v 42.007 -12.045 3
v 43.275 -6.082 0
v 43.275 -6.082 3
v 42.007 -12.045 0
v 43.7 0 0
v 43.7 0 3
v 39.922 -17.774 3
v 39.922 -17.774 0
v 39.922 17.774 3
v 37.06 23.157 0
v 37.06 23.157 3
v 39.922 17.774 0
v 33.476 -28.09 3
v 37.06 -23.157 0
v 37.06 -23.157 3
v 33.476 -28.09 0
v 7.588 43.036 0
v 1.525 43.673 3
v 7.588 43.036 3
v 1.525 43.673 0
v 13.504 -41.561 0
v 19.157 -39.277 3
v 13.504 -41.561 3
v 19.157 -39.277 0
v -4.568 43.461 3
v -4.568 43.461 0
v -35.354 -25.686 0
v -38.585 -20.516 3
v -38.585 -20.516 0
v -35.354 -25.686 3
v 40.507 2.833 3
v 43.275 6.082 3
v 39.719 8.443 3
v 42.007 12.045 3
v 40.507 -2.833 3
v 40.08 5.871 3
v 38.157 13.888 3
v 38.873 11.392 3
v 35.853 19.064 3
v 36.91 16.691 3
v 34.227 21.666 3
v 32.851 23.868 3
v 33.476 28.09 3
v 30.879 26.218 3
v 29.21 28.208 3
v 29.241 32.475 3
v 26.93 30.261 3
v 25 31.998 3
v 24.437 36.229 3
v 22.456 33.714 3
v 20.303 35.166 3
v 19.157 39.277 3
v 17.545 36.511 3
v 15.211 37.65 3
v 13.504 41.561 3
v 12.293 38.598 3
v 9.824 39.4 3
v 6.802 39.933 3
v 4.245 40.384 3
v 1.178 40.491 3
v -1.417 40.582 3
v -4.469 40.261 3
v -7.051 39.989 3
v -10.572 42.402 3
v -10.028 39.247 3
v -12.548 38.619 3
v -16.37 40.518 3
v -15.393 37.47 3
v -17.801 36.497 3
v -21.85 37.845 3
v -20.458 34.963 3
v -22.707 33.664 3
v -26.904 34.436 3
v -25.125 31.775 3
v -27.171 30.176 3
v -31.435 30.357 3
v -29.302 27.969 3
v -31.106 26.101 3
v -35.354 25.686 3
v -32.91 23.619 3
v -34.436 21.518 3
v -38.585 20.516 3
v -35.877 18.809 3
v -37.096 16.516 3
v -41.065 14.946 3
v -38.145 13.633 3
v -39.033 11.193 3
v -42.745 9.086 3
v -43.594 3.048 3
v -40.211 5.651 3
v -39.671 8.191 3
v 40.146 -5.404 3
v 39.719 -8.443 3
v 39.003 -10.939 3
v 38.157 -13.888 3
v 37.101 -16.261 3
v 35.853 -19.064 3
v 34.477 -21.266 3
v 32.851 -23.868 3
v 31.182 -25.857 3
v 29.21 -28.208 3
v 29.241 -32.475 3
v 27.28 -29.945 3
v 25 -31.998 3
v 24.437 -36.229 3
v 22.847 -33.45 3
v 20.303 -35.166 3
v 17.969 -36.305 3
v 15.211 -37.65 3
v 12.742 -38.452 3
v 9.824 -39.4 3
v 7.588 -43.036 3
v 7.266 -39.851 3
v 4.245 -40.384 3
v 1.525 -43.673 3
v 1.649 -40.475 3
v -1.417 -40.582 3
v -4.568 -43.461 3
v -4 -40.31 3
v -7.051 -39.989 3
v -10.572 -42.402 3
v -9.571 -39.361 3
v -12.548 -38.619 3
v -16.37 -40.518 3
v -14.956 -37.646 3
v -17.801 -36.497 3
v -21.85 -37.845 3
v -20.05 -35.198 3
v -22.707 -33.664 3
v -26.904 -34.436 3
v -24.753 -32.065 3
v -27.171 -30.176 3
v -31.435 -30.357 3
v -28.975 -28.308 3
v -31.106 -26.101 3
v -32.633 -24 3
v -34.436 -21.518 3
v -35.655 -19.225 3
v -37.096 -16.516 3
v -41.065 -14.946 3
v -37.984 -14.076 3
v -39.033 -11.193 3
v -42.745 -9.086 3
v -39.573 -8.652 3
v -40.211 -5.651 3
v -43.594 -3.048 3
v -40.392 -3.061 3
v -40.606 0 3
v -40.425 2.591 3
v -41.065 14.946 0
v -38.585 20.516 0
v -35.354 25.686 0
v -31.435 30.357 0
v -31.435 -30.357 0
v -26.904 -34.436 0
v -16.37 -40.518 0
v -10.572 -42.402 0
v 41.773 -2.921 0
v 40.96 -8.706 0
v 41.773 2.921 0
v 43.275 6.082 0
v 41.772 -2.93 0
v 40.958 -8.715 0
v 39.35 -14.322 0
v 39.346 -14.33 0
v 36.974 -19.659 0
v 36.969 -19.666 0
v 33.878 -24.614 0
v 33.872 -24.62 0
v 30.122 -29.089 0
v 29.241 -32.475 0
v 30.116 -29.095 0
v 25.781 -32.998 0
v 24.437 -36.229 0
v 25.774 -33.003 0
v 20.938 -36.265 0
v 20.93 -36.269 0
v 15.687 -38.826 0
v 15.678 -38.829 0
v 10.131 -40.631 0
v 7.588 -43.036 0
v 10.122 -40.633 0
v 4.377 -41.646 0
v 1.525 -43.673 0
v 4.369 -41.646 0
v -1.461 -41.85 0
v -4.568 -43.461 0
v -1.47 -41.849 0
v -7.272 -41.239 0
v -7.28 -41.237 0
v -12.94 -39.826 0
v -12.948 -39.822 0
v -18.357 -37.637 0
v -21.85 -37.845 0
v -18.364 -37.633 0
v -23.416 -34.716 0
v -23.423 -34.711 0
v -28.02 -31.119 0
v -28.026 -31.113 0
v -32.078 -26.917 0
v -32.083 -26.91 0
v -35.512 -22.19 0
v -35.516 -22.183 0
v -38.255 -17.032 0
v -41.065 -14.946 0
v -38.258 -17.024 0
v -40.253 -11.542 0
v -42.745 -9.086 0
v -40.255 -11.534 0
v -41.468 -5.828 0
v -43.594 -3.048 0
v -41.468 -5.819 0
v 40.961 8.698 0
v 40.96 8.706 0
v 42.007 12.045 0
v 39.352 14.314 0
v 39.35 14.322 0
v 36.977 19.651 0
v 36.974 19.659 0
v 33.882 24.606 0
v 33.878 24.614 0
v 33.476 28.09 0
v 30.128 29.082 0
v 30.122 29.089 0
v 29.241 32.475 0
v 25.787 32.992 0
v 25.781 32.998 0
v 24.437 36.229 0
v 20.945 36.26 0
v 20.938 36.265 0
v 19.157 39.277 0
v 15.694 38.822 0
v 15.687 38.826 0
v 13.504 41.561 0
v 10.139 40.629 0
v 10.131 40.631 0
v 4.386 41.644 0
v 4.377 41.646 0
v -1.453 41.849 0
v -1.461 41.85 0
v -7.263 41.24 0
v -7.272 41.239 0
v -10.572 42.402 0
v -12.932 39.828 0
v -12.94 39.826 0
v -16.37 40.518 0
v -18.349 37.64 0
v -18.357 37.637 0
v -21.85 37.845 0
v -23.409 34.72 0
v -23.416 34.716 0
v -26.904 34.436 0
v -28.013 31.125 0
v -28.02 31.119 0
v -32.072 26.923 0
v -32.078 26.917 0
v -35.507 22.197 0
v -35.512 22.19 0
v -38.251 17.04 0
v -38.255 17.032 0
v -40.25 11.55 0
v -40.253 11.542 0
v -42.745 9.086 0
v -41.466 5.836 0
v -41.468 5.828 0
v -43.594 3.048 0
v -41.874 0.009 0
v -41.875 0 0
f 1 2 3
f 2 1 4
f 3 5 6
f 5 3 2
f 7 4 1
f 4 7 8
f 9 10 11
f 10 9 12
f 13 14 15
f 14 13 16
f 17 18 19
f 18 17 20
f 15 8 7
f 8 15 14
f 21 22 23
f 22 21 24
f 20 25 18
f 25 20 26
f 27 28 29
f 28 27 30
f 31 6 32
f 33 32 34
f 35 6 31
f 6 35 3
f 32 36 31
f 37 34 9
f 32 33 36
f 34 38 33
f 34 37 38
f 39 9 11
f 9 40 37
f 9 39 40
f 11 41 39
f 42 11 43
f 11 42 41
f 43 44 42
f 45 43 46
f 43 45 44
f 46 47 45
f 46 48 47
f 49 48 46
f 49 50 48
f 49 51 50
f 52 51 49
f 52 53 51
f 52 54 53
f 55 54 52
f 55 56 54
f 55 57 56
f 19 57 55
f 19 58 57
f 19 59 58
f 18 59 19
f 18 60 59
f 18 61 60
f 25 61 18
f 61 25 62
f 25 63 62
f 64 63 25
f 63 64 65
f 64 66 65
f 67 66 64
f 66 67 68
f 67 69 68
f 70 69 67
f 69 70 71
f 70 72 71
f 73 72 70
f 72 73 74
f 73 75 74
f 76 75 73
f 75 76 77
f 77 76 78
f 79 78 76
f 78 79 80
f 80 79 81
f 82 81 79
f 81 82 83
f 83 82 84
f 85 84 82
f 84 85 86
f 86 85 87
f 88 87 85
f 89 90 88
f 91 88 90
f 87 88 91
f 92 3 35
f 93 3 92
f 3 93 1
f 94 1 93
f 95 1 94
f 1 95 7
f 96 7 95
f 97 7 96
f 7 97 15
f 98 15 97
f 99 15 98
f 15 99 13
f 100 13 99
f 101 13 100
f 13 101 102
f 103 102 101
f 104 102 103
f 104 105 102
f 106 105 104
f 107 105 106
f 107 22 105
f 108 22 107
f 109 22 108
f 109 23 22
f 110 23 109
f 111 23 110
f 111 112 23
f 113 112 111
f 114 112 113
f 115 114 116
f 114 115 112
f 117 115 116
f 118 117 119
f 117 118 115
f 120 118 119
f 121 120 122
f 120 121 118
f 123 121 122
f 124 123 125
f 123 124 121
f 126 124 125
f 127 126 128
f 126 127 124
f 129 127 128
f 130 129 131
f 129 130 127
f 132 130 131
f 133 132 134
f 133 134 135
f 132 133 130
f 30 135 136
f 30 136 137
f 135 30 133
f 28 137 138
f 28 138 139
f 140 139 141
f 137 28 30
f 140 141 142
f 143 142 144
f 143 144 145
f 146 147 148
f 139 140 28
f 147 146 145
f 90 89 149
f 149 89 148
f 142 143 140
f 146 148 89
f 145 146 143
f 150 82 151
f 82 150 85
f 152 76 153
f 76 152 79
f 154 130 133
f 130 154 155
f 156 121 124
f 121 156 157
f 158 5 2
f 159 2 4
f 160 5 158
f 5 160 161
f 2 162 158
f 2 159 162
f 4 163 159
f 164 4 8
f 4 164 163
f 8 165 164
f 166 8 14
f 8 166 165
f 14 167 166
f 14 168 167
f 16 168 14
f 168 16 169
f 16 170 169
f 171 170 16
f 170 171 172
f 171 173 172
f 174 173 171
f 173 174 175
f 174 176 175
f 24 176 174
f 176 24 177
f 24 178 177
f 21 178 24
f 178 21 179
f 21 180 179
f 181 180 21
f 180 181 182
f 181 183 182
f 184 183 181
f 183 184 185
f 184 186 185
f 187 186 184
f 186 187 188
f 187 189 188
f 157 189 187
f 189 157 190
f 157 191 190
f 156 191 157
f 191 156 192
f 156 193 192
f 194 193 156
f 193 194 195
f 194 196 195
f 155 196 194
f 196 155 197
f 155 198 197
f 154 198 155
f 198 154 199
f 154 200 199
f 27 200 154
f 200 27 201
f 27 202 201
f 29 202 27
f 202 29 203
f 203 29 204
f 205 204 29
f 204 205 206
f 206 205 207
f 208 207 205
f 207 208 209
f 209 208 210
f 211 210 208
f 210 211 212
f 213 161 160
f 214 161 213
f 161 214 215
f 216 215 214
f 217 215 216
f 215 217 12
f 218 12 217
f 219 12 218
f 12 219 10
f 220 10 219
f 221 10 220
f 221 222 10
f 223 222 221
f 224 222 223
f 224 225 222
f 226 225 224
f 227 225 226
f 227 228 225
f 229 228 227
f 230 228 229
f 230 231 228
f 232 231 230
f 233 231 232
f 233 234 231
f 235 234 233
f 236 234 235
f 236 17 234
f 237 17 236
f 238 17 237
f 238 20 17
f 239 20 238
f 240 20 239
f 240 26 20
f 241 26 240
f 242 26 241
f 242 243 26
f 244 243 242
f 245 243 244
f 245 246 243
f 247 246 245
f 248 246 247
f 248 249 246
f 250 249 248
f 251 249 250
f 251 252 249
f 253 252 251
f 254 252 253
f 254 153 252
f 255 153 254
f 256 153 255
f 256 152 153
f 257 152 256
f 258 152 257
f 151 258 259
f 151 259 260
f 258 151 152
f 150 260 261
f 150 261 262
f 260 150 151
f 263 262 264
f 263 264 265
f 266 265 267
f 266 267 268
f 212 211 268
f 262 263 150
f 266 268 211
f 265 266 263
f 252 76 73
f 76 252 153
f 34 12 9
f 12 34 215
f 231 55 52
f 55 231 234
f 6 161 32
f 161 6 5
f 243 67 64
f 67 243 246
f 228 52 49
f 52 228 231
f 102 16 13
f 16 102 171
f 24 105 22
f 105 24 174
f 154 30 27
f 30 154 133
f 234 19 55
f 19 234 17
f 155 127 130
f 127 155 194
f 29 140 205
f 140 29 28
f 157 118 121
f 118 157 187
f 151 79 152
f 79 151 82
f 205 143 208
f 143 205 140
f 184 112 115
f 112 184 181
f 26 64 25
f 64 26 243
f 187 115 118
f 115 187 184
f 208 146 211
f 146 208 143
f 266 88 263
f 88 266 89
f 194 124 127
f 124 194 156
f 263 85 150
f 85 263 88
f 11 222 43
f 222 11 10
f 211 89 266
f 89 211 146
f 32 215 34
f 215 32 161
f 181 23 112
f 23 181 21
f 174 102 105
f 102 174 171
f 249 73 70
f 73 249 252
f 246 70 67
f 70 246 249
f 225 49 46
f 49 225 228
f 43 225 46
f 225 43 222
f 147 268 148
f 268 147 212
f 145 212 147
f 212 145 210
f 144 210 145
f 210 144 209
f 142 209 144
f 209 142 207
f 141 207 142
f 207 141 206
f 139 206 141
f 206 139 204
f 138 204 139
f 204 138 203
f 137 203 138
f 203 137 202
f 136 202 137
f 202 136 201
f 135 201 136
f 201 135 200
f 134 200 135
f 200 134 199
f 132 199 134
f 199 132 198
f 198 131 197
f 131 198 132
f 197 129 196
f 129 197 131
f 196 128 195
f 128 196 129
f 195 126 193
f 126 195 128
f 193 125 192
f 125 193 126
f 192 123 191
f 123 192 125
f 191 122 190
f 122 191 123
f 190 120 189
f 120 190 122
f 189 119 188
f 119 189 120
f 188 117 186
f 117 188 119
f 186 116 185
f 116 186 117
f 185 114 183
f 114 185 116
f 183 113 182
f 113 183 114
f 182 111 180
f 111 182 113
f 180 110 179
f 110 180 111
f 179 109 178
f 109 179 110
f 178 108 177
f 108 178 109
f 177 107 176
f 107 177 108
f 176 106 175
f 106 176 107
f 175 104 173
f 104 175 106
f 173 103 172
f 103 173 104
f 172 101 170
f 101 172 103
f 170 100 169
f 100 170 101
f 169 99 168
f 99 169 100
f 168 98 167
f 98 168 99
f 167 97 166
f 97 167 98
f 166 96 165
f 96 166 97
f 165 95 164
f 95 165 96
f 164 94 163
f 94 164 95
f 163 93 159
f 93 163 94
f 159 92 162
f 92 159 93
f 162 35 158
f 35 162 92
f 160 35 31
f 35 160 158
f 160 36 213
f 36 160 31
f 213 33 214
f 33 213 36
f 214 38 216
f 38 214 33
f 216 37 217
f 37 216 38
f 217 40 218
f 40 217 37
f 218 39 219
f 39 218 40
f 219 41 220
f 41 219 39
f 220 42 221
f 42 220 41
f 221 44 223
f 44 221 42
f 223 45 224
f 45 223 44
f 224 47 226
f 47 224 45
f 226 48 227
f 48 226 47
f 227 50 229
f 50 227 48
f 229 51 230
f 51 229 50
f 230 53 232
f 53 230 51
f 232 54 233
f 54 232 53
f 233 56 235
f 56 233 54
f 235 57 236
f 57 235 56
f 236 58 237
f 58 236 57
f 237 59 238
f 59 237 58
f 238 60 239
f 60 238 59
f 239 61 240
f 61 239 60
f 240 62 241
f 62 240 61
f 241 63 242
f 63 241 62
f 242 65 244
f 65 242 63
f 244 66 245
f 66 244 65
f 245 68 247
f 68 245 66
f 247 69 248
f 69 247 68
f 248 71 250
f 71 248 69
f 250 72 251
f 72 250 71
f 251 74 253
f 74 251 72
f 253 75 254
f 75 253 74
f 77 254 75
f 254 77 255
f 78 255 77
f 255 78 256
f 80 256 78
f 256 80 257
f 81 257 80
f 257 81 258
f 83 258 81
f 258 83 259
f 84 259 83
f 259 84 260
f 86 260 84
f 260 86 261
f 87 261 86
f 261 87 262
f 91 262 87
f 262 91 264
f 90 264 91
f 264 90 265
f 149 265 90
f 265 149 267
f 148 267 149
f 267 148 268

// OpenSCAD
// [FL_INDEX: keywords="openscad, 3d_parametric, Solar_Burner_Tube, csg_solid" | COT="Parametric OpenSCAD design from 3DCodeverse"]
// Title: Solar Burner Tube! 

// Choose Solar Burner Tube or its lid
print_object=1;  // [1:Solar Burner Tube,2:Lid]

// The height of the reflector. I propose a ratio height/focus_area of 2.215 
height=40; // [10:200]

// The focus point is at the smaller aperture. This defines the radius of it.
focus_area=18; //[1:80]

// The resolution of the reflector.
resolution= 45; //[45,80,120]

// Horizontal wall thickness. Set to 0 for a solid body. Try to find a good value for your nozzle size.
wall=1.7; 

// The height of the lid ring. Set to 0 for no lid friction ring.
lid=3; // [0:10]

// The clearence for printing the lid ring and its friction.
clr=0.2; 


//////////////////////////////////////////////////////////////////////////////////////////////
// Solar Burner Tube
// 
// Copyright (C) 2013  Lochner, Juergen
// http://www.thingiverse.com/Ablapo/designs
//
// Warning: It is not recommanded to build this thing out of mirroring materials!
// It could cause fire and eye damage. Sun glases will not protect your eyes.
// Think of it as a big magnifying lens, laser beam and lighter when using it. 
// Remove the reflecting surface for a save storage.
//
// This program is distributed in the hope that it will be useful,
// but WITHOUT ANY WARRANTY; without even the implied warranty of
// MERCHANTABILITY or FITNESS FOR A PARTICULAR PURPOSE. 
//
// This program is free software. It is 
// licensed under the Attribution - Creative Commons license.
// http://creativecommons.org/licenses/by/3.0/
//////////////////////////////////////////////////////////////////////////////////////////////

module paraboloid (y=50, f=10, rfa=0, fc=1, detail=44){
	// y = height of paraboloid
	// f = focus distance 
	// fc : 1 = center paraboloid in focus point(x=0, y=f); 0 = center paraboloid on top (x=0, y=0)
	// rfa = radius of the focus area : 0 = point focus
	// detail = $fn of cone

	hi = (y+2*f)/sqrt(2);								// height and radius of the cone -> alpha = 45° -> sin(45°)=1/sqrt(2)
	x =2*f*sqrt(y/f);									// x  = half size of parabola
	
   translate([0,0,-f*fc])								// center on focus 
	rotate_extrude(convexity = 10,$fn=detail )		// extrude paraboild
	translate([rfa,0,0])								// translate for fokus area	 
	difference(){
		union(){											// adding square for focal area
			projection(cut = true)																			// reduce from 3D cone to 2D parabola
				translate([0,0,f*2]) rotate([45,0,0])													// rotate cone 45° and translate for cutting
				translate([0,0,-hi/2])cylinder(h= hi, r1=hi, r2=0, center=true, $fn=detail);   	// center cone on tip
			translate([-(rfa+x ),0]) square ([rfa+x , y ]);											// focal area square
		}
		translate([-(2*rfa+x ), -1/2]) square ([rfa+x ,y +1] ); 					// cut of half at rotation center 
	}
}

module reflector(hr=40, xr=20, details=80){
	// for optimum covered area:    hr/xr = 2.215  -> hr = 2x distance(from focus to parabola slope of 45°)  
	fr= xr/2;  						// xr= 2*f*sqrt(f/f)
	yr=hr+fr;
	
	translate([0,0,hr])rotate([180,0,0])	
	difference(){
		if (wall>0) {
			paraboloid (yr ,fr , wall , 1,details );
			if (lid>0) {
				translate([0,0, hr-lid/2])cylinder(h=lid,r=wall+2*sqrt(yr*yr-yr*hr),center=true,$fn=details);
				}
			}
		translate([0,0, -0.01])paraboloid (yr+0.02 ,fr , 0, 1,details );
		translate([0,0,-(fr+1)/2])cube([xr*2+wall*4+1,xr*2+wall*4+1,fr+1],center=true);
	}
}


module  print_lit(hr=40, xr=20, details=80){

	fr= xr/2;  						// xr= 2*f*sqrt(f/f)
	yr=hr+fr;
	
	if (wall>0) {
			if (lid>0) {
				difference(){
					translate([0,0,0])cylinder(h=lid+2+wall,r=wall+2*sqrt(yr*yr-yr*hr)+wall+clr,center=true,$fn=details);
					translate([0,0,wall])cylinder(h=lid+2+wall,r=wall+2*sqrt(yr*yr-yr*hr) +clr,center=true,$fn=details);
				}
			}
	}
}

if (print_object==2) print_lit(height,focus_area,resolution);
if (print_object==1) reflector(height,focus_area,resolution);
